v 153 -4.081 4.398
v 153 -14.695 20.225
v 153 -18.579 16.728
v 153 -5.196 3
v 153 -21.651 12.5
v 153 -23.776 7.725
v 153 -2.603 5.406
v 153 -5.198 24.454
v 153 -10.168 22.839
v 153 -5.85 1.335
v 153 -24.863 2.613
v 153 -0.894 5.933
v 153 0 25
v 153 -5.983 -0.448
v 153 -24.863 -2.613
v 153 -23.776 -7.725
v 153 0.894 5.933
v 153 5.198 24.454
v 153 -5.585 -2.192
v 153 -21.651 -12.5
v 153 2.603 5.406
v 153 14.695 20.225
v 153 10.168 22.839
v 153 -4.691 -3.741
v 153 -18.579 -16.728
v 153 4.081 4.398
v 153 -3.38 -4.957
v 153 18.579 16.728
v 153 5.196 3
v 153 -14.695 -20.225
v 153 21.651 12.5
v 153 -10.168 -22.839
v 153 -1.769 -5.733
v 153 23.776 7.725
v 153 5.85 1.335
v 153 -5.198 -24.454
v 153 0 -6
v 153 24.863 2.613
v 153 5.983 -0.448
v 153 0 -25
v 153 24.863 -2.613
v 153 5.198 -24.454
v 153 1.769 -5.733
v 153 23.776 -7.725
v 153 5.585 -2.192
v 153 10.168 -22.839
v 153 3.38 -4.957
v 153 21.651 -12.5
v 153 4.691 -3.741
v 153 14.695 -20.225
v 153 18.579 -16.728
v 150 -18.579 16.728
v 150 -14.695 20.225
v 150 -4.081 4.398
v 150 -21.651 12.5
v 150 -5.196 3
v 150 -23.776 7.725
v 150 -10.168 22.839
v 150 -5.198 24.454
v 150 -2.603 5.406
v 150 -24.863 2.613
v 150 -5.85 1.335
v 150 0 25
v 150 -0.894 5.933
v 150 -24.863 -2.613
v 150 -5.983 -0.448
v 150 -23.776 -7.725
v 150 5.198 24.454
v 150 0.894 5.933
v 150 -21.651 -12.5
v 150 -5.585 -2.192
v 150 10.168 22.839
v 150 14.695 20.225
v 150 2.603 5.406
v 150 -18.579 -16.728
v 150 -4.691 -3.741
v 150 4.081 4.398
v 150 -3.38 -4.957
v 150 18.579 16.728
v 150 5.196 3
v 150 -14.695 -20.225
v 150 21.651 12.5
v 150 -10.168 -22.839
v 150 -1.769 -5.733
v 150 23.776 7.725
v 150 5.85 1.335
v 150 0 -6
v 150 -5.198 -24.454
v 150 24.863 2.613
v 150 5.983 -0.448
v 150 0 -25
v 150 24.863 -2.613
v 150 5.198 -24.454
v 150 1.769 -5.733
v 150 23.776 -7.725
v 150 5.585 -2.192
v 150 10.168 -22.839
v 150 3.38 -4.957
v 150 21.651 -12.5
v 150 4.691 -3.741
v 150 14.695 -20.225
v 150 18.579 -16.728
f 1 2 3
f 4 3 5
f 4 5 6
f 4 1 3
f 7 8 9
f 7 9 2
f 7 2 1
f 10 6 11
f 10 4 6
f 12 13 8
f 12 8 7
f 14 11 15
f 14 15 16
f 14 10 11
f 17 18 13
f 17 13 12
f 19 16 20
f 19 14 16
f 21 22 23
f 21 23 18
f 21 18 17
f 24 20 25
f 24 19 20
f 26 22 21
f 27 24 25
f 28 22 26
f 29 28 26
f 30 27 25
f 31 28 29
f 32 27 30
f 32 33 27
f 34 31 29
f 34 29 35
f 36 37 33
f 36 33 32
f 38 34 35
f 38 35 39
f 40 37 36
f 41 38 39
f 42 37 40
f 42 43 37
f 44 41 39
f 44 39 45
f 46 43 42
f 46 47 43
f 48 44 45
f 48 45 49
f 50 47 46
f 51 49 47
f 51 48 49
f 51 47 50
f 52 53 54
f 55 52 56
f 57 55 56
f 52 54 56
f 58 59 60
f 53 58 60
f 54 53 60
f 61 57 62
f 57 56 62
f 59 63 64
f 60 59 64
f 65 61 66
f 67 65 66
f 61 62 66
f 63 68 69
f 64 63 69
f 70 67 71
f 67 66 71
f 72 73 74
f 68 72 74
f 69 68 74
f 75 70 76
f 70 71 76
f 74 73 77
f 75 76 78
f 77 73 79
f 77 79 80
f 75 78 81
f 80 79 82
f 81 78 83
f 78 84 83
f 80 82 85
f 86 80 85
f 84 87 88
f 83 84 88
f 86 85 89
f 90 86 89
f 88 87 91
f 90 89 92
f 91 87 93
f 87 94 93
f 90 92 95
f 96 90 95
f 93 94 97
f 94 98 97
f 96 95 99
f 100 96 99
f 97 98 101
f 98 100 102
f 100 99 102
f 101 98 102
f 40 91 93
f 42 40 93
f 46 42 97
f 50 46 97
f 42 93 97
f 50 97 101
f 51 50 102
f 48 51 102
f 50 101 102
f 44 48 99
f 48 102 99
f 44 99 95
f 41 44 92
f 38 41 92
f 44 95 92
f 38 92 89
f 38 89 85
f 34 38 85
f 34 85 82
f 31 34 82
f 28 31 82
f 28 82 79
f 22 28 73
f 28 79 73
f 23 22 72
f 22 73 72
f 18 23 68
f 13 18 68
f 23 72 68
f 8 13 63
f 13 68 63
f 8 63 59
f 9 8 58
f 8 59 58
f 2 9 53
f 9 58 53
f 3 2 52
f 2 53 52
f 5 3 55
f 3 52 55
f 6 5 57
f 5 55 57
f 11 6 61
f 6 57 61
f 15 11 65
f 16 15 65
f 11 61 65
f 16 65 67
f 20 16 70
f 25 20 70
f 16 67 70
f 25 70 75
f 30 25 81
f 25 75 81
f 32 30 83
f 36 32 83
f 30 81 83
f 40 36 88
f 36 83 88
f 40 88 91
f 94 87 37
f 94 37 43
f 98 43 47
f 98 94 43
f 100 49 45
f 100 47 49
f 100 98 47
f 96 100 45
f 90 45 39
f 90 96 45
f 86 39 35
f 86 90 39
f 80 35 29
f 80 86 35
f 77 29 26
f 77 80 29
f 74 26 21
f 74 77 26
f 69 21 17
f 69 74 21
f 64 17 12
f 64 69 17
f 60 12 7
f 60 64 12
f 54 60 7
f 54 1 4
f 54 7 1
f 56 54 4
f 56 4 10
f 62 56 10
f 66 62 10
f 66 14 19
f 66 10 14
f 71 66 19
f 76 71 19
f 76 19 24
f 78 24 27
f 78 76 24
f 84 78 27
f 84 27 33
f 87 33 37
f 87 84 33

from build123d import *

# Parameters (mm, degrees)
CYLINDER007_R           = 6
CYLINDER007_DEPTH       = 236
CYLINDER007_PITCH_ANGLE = 90
CYLINDER002_R           = 25
CYLINDER002_DEPTH       = 3
CYLINDER002_PITCH_ANGLE = 90


with BuildPart() as connector_bore:
    # Cylinder007 → Cylinder007 (new body)
    with BuildSketch(Plane.XY):
        Circle(CYLINDER007_R)
    extrude(amount=CYLINDER007_DEPTH)


with BuildPart() as connector_bore_1:
    # Cylinder007 pitch: moved
    add(connector_bore.part.rotate(Axis((0, 0, 0), (0, 1, 0)), CYLINDER007_PITCH_ANGLE))


with BuildPart() as connector_bore_2:
    # Cylinder007 placement: moved
    add(connector_bore_1.part.moved(Location((-45, 0, 0))))


with BuildPart() as cut005:
    # Cylinder002 → Cylinder002 (new body)
    with BuildSketch(Plane.XY):
        Circle(CYLINDER002_R)
    extrude(amount=CYLINDER002_DEPTH)


with BuildPart() as cut005_1:
    # Cylinder002 pitch: moved
    add(cut005.part.rotate(Axis((0, 0, 0), (0, 1, 0)), CYLINDER002_PITCH_ANGLE))


with BuildPart() as cut005_2:
    # Cylinder002 placement: moved
    add(cut005_1.part.moved(Location((150, 0, 0))))

    # Cut005: cut connector_bore
    add(connector_bore_2.part, mode=Mode.SUBTRACT)


solid = cut005_2.part
